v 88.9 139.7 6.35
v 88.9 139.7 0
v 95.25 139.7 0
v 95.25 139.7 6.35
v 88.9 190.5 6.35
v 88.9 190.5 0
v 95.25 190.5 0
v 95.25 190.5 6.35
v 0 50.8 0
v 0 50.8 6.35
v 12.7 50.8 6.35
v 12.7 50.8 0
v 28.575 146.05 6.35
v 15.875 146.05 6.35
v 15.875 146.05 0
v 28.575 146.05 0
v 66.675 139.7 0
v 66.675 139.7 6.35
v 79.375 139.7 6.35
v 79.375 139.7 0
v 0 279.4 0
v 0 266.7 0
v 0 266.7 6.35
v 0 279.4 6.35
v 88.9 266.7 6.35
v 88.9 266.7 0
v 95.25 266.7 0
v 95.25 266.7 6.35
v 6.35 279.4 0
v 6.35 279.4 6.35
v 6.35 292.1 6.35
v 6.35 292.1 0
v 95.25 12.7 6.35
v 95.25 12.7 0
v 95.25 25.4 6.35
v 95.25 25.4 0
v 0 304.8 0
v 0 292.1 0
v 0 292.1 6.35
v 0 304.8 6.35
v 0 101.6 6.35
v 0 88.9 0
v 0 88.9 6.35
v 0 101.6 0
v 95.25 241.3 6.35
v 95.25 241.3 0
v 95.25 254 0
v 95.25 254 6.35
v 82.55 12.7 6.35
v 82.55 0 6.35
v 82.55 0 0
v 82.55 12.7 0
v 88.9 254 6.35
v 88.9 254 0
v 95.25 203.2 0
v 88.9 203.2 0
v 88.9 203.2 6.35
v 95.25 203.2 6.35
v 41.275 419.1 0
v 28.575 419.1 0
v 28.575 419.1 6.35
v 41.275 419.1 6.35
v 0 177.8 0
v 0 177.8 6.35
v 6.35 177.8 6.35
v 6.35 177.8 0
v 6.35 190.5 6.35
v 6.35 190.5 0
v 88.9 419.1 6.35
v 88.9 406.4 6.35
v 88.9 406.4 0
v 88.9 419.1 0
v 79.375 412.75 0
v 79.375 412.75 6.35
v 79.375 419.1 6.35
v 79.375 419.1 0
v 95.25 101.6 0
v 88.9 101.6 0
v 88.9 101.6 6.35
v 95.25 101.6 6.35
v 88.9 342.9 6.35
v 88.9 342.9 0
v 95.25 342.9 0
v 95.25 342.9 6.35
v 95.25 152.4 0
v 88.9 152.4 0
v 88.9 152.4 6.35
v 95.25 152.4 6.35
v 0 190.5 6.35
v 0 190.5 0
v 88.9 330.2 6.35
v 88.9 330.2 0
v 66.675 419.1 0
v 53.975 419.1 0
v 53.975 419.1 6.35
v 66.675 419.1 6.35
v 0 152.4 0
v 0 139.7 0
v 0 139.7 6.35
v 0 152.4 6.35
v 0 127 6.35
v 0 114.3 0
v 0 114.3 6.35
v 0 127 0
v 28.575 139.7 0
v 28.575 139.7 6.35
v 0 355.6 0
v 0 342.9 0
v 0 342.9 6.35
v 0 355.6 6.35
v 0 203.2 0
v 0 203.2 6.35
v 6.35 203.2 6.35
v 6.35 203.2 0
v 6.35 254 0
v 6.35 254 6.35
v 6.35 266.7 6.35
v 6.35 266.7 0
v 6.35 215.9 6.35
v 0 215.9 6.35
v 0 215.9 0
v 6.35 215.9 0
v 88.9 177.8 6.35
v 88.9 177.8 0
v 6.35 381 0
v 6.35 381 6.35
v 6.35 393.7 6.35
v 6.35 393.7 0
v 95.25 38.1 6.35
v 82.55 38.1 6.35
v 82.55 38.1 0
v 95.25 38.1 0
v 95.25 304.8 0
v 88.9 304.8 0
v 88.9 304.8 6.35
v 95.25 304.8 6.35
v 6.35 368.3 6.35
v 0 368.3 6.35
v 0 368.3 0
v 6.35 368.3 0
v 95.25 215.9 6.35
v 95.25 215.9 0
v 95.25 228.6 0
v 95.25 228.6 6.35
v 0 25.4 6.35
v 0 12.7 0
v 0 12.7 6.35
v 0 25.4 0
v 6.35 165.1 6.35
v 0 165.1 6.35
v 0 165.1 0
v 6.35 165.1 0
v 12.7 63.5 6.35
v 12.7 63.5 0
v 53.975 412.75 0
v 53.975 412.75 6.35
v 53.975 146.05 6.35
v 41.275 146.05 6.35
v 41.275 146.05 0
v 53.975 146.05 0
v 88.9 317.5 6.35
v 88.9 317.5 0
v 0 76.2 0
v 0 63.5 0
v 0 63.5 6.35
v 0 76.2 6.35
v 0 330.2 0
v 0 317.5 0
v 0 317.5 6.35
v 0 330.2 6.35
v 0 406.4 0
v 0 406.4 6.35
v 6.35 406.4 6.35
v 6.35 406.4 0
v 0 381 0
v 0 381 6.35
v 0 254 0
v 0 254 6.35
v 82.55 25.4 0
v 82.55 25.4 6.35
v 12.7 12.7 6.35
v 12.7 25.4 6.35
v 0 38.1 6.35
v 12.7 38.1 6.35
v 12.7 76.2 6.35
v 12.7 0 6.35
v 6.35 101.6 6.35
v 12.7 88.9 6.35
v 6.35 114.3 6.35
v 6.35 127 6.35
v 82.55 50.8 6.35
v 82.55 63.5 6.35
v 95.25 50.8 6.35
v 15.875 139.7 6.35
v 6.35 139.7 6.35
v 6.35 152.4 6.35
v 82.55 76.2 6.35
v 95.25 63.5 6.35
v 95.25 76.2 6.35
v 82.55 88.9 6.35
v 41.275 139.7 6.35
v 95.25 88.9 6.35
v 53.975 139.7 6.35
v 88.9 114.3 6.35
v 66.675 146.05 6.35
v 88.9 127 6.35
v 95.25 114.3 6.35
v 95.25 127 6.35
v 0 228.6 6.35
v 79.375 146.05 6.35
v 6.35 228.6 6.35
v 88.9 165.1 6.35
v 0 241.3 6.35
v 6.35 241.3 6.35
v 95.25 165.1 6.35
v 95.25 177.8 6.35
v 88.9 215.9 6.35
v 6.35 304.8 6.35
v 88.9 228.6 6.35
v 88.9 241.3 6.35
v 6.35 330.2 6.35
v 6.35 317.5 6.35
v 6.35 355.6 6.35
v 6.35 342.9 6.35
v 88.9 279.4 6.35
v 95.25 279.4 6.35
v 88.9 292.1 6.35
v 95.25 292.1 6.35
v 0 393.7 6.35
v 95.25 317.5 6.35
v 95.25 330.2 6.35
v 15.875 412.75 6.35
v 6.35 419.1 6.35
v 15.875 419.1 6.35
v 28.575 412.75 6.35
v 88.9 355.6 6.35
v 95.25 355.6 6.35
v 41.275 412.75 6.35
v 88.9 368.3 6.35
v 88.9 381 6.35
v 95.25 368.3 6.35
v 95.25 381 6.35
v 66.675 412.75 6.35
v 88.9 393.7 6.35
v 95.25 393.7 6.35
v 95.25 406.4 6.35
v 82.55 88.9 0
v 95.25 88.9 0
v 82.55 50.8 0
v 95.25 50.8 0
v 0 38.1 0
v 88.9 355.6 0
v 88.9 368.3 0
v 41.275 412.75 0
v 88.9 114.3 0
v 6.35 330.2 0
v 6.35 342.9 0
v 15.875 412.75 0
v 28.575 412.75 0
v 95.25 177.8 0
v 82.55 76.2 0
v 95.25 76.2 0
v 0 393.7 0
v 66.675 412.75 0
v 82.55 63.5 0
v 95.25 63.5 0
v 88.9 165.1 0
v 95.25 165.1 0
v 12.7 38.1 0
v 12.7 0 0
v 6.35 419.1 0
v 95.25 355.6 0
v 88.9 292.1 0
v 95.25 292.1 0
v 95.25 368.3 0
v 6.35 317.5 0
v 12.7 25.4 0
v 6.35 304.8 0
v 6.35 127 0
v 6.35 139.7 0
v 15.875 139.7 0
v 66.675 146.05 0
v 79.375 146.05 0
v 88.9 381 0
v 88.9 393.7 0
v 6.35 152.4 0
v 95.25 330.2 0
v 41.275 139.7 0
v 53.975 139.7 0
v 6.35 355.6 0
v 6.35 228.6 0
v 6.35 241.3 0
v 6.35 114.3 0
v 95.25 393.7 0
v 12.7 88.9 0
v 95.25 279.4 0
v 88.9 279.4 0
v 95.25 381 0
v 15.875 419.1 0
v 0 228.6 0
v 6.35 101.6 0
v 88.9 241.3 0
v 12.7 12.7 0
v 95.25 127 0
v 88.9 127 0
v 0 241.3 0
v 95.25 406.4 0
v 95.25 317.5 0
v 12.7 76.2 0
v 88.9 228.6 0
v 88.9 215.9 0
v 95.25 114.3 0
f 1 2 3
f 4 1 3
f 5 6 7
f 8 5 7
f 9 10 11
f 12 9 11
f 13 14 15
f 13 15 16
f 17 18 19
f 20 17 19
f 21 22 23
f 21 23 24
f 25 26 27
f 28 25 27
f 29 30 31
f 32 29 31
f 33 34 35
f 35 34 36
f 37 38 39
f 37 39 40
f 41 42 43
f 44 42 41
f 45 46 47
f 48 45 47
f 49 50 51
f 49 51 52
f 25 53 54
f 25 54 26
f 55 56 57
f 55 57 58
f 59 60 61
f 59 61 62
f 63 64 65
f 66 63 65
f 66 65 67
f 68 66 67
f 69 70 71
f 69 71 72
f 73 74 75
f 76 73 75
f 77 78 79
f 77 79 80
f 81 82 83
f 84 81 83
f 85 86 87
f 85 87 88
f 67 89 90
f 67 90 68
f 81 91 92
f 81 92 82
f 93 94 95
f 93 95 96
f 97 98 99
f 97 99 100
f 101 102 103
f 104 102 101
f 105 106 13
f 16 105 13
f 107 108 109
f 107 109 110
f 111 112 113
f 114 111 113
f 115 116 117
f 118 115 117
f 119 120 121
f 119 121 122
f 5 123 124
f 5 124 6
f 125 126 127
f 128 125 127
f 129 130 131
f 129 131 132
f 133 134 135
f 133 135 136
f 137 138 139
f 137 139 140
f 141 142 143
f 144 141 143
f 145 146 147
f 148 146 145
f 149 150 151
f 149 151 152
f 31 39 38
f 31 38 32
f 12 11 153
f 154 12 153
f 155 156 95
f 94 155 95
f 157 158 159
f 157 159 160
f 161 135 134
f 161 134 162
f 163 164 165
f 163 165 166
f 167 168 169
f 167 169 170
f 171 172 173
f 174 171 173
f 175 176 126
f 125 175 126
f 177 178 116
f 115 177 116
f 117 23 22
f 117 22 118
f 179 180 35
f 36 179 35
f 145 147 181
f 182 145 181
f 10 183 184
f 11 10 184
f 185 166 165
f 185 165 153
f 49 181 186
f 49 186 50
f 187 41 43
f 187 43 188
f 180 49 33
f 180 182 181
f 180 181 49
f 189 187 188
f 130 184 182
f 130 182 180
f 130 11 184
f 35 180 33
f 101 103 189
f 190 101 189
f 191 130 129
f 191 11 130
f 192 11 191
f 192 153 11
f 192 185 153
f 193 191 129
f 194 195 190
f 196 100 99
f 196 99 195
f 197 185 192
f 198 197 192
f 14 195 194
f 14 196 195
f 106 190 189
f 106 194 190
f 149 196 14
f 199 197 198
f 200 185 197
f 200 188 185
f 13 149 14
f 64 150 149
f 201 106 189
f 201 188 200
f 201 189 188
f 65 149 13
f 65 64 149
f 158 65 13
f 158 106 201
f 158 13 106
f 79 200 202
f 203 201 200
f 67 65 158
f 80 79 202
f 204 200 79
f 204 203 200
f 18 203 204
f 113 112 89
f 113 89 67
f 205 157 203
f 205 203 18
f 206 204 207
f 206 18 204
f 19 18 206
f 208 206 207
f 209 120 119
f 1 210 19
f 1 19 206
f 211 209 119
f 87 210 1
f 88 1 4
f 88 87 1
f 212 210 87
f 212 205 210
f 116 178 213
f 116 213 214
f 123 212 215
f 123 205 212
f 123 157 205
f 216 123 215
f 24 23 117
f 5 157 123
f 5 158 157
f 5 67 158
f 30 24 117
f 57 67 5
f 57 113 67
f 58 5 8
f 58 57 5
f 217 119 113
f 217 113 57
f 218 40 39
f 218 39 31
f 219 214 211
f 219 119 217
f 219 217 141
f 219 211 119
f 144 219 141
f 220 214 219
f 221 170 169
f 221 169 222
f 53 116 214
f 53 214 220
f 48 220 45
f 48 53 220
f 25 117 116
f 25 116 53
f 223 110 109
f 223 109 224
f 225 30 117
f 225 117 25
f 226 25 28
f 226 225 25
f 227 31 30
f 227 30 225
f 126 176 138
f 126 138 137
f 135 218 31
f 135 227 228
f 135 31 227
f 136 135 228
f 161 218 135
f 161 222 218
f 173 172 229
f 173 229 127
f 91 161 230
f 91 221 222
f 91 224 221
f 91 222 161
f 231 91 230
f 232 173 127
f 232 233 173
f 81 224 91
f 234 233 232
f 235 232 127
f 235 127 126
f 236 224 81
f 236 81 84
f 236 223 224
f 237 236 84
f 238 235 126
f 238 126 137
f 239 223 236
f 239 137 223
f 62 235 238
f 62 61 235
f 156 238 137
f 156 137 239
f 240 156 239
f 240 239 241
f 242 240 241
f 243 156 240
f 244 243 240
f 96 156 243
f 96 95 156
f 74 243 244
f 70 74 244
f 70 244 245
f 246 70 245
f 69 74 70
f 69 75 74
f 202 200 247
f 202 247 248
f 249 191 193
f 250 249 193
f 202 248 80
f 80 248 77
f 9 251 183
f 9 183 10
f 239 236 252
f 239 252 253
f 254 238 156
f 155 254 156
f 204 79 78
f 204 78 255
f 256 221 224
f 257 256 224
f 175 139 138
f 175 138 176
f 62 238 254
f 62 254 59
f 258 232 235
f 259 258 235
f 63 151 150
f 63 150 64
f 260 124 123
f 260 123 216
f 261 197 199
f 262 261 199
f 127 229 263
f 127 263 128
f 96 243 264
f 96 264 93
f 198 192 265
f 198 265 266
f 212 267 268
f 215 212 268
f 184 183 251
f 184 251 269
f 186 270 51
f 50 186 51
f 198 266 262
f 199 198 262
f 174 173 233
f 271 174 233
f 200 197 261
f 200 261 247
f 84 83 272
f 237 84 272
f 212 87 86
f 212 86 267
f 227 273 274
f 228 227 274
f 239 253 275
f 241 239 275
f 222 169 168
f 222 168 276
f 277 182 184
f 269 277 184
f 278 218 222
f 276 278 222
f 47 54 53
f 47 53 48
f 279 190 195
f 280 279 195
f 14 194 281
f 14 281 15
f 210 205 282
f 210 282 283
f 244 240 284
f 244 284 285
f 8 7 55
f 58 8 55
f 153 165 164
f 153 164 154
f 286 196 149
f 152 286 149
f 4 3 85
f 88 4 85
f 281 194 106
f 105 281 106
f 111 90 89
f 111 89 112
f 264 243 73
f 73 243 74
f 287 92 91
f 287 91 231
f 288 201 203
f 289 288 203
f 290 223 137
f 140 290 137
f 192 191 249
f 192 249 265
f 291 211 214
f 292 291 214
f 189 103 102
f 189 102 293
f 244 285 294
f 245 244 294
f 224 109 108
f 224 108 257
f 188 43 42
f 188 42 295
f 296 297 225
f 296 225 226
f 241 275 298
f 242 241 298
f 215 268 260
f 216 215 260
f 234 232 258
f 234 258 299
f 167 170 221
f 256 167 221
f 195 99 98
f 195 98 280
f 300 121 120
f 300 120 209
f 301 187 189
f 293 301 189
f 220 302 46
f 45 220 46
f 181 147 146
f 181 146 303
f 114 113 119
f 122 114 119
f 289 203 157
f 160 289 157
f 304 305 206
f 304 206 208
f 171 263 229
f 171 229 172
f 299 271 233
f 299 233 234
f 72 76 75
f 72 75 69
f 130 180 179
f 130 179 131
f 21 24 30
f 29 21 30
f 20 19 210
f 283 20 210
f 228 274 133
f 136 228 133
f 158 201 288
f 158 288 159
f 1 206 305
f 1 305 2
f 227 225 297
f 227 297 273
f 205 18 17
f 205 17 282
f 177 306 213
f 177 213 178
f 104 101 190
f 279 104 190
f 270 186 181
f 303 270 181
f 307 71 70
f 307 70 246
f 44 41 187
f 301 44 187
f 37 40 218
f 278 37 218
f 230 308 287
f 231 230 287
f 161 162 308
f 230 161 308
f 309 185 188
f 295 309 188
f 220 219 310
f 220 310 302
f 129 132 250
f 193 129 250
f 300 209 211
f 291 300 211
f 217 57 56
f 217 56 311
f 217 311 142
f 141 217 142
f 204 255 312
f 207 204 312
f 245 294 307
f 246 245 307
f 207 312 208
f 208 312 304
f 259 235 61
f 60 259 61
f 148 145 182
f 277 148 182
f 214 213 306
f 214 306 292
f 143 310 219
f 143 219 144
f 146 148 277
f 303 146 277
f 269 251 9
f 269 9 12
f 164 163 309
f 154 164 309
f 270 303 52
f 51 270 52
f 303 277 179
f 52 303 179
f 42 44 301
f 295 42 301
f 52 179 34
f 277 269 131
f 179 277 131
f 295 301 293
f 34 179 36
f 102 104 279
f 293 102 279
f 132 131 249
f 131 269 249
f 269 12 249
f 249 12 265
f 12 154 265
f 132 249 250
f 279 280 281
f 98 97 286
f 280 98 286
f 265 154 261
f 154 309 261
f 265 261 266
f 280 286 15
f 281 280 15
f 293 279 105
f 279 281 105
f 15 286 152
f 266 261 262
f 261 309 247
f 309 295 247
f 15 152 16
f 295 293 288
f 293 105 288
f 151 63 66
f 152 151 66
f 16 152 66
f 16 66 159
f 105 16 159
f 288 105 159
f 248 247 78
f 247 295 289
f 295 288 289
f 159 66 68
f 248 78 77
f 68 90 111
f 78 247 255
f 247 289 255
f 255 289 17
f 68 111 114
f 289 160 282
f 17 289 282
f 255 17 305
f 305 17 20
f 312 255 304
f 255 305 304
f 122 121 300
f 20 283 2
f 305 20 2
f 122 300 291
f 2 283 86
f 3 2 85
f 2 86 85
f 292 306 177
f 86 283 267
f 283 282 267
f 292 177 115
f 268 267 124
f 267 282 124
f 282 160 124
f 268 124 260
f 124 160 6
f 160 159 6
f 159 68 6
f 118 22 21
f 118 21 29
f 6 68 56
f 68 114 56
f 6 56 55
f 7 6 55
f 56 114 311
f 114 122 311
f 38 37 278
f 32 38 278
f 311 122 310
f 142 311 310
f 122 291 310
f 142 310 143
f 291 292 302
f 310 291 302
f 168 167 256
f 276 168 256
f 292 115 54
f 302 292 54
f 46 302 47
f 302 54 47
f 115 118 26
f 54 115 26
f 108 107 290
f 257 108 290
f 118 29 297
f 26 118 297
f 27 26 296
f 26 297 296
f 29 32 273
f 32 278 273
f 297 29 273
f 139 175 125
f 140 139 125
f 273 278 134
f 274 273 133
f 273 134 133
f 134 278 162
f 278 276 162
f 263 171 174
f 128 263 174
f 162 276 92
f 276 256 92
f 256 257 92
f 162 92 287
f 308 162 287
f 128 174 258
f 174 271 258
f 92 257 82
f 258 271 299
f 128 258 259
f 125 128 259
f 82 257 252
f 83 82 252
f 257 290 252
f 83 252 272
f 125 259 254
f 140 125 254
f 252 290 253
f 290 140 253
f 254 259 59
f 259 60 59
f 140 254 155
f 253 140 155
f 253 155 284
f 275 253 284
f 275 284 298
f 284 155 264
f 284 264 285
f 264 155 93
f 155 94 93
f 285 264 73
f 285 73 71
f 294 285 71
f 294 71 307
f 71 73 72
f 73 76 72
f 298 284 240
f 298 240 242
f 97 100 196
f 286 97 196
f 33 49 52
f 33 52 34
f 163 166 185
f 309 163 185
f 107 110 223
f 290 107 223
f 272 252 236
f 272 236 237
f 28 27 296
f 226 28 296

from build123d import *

# Parameters (mm, degrees)
SKETCH2_W           = 95.25
SKETCH2_H           = 419.1
BOSS_EXTRUDE1_DEPTH = 6.35
SKETCH3_W           = 6.35
SKETCH3_H           = 12.7
CUT_EXTRUDE1_DEPTH  = 7.35
LPATTERN1_COUNT     = 17
LPATTERN1_PITCH     = 25.4
SKETCH4_W           = 12.7
SKETCH4_H           = 6.35
CUT_EXTRUDE2_DEPTH  = 7.35
SKETCH5_W           = 6.35
SKETCH5_H           = 12.7
CUT_EXTRUDE3_DEPTH  = 7.35
LPATTERN2_COUNT     = 4
LPATTERN2_PITCH     = 25.4
SKETCH6_W           = 12.7
SKETCH6_H           = 6.35
CUT_EXTRUDE4_DEPTH  = 7.35
LPATTERN3_COUNT     = 2
LPATTERN3_PITCH     = 25.4
LPATTERN3_COL_COUNT = 2
LPATTERN3_COL_PITCH = 25.4


with BuildPart() as part:
    # Sketch2 → Boss-Extrude1 (new body)
    with BuildSketch(Plane.XY):
        with Locations((47.625, 209.55)):
            Rectangle(SKETCH2_W, SKETCH2_H)
    extrude(amount=BOSS_EXTRUDE1_DEPTH)

    # Sketch3 → Cut-Extrude1 (cut, through all)
    with BuildSketch(Plane.XY.offset(6.35)):
        with Locations((3.175, 6.35)):
            Rectangle(SKETCH3_W, SKETCH3_H)
        with Locations((92.075, 6.35)):
            Rectangle(SKETCH3_W, SKETCH3_H)
    cut_extrude1 = extrude(amount=-CUT_EXTRUDE1_DEPTH, mode=Mode.SUBTRACT)

    # LPattern1: Cut-Extrude1 ×17
    with Locations(*[(0, i * LPATTERN1_PITCH, 0) for i in range(1, LPATTERN1_COUNT)]):
        add(cut_extrude1, mode=Mode.SUBTRACT)

    # Sketch4 → Cut-Extrude2 (cut, through all)
    with BuildSketch(Plane.XY.offset(6.35)):
        with Locations((47.625, 415.925)):
            Rectangle(SKETCH4_W, SKETCH4_H)
        with Locations((22.225, 415.925)):
            Rectangle(SKETCH4_W, SKETCH4_H)
        with Locations((73.025, 415.925)):
            Rectangle(SKETCH4_W, SKETCH4_H)
    extrude(amount=-CUT_EXTRUDE2_DEPTH, mode=Mode.SUBTRACT)

    # Sketch5 → Cut-Extrude3 (cut, through all)
    with BuildSketch(Plane.XY.offset(6.35)):
        with Locations((9.525, 6.35)):
            Rectangle(SKETCH5_W, SKETCH5_H)
        with Locations((85.725, 6.35)):
            Rectangle(SKETCH5_W, SKETCH5_H)
    cut_extrude3 = extrude(amount=-CUT_EXTRUDE3_DEPTH, mode=Mode.SUBTRACT)

    # LPattern2: Cut-Extrude3 ×4
    with Locations(*[(0, i * LPATTERN2_PITCH, 0) for i in range(1, LPATTERN2_COUNT)]):
        add(cut_extrude3, mode=Mode.SUBTRACT)

    # Sketch6 → Cut-Extrude4 (cut, through all)
    with BuildSketch(Plane.XY.offset(6.35)):
        with Locations((47.625, 142.875)):
            Rectangle(SKETCH6_W, SKETCH6_H)
    cut_extrude4 = extrude(amount=-CUT_EXTRUDE4_DEPTH, mode=Mode.SUBTRACT)

    # LPattern3: Cut-Extrude4 ×2
    with Locations(*[(i * LPATTERN3_PITCH, 0, 0) for i in range(1, LPATTERN3_COUNT)]):
        add(cut_extrude4, mode=Mode.SUBTRACT)

    # LPattern3 col: Cut-Extrude4 ×2
    with Locations(*[(-i * LPATTERN3_COL_PITCH, 0, 0) for i in range(1, LPATTERN3_COL_COUNT)]):
        add(cut_extrude4, mode=Mode.SUBTRACT)


solid = part.part
